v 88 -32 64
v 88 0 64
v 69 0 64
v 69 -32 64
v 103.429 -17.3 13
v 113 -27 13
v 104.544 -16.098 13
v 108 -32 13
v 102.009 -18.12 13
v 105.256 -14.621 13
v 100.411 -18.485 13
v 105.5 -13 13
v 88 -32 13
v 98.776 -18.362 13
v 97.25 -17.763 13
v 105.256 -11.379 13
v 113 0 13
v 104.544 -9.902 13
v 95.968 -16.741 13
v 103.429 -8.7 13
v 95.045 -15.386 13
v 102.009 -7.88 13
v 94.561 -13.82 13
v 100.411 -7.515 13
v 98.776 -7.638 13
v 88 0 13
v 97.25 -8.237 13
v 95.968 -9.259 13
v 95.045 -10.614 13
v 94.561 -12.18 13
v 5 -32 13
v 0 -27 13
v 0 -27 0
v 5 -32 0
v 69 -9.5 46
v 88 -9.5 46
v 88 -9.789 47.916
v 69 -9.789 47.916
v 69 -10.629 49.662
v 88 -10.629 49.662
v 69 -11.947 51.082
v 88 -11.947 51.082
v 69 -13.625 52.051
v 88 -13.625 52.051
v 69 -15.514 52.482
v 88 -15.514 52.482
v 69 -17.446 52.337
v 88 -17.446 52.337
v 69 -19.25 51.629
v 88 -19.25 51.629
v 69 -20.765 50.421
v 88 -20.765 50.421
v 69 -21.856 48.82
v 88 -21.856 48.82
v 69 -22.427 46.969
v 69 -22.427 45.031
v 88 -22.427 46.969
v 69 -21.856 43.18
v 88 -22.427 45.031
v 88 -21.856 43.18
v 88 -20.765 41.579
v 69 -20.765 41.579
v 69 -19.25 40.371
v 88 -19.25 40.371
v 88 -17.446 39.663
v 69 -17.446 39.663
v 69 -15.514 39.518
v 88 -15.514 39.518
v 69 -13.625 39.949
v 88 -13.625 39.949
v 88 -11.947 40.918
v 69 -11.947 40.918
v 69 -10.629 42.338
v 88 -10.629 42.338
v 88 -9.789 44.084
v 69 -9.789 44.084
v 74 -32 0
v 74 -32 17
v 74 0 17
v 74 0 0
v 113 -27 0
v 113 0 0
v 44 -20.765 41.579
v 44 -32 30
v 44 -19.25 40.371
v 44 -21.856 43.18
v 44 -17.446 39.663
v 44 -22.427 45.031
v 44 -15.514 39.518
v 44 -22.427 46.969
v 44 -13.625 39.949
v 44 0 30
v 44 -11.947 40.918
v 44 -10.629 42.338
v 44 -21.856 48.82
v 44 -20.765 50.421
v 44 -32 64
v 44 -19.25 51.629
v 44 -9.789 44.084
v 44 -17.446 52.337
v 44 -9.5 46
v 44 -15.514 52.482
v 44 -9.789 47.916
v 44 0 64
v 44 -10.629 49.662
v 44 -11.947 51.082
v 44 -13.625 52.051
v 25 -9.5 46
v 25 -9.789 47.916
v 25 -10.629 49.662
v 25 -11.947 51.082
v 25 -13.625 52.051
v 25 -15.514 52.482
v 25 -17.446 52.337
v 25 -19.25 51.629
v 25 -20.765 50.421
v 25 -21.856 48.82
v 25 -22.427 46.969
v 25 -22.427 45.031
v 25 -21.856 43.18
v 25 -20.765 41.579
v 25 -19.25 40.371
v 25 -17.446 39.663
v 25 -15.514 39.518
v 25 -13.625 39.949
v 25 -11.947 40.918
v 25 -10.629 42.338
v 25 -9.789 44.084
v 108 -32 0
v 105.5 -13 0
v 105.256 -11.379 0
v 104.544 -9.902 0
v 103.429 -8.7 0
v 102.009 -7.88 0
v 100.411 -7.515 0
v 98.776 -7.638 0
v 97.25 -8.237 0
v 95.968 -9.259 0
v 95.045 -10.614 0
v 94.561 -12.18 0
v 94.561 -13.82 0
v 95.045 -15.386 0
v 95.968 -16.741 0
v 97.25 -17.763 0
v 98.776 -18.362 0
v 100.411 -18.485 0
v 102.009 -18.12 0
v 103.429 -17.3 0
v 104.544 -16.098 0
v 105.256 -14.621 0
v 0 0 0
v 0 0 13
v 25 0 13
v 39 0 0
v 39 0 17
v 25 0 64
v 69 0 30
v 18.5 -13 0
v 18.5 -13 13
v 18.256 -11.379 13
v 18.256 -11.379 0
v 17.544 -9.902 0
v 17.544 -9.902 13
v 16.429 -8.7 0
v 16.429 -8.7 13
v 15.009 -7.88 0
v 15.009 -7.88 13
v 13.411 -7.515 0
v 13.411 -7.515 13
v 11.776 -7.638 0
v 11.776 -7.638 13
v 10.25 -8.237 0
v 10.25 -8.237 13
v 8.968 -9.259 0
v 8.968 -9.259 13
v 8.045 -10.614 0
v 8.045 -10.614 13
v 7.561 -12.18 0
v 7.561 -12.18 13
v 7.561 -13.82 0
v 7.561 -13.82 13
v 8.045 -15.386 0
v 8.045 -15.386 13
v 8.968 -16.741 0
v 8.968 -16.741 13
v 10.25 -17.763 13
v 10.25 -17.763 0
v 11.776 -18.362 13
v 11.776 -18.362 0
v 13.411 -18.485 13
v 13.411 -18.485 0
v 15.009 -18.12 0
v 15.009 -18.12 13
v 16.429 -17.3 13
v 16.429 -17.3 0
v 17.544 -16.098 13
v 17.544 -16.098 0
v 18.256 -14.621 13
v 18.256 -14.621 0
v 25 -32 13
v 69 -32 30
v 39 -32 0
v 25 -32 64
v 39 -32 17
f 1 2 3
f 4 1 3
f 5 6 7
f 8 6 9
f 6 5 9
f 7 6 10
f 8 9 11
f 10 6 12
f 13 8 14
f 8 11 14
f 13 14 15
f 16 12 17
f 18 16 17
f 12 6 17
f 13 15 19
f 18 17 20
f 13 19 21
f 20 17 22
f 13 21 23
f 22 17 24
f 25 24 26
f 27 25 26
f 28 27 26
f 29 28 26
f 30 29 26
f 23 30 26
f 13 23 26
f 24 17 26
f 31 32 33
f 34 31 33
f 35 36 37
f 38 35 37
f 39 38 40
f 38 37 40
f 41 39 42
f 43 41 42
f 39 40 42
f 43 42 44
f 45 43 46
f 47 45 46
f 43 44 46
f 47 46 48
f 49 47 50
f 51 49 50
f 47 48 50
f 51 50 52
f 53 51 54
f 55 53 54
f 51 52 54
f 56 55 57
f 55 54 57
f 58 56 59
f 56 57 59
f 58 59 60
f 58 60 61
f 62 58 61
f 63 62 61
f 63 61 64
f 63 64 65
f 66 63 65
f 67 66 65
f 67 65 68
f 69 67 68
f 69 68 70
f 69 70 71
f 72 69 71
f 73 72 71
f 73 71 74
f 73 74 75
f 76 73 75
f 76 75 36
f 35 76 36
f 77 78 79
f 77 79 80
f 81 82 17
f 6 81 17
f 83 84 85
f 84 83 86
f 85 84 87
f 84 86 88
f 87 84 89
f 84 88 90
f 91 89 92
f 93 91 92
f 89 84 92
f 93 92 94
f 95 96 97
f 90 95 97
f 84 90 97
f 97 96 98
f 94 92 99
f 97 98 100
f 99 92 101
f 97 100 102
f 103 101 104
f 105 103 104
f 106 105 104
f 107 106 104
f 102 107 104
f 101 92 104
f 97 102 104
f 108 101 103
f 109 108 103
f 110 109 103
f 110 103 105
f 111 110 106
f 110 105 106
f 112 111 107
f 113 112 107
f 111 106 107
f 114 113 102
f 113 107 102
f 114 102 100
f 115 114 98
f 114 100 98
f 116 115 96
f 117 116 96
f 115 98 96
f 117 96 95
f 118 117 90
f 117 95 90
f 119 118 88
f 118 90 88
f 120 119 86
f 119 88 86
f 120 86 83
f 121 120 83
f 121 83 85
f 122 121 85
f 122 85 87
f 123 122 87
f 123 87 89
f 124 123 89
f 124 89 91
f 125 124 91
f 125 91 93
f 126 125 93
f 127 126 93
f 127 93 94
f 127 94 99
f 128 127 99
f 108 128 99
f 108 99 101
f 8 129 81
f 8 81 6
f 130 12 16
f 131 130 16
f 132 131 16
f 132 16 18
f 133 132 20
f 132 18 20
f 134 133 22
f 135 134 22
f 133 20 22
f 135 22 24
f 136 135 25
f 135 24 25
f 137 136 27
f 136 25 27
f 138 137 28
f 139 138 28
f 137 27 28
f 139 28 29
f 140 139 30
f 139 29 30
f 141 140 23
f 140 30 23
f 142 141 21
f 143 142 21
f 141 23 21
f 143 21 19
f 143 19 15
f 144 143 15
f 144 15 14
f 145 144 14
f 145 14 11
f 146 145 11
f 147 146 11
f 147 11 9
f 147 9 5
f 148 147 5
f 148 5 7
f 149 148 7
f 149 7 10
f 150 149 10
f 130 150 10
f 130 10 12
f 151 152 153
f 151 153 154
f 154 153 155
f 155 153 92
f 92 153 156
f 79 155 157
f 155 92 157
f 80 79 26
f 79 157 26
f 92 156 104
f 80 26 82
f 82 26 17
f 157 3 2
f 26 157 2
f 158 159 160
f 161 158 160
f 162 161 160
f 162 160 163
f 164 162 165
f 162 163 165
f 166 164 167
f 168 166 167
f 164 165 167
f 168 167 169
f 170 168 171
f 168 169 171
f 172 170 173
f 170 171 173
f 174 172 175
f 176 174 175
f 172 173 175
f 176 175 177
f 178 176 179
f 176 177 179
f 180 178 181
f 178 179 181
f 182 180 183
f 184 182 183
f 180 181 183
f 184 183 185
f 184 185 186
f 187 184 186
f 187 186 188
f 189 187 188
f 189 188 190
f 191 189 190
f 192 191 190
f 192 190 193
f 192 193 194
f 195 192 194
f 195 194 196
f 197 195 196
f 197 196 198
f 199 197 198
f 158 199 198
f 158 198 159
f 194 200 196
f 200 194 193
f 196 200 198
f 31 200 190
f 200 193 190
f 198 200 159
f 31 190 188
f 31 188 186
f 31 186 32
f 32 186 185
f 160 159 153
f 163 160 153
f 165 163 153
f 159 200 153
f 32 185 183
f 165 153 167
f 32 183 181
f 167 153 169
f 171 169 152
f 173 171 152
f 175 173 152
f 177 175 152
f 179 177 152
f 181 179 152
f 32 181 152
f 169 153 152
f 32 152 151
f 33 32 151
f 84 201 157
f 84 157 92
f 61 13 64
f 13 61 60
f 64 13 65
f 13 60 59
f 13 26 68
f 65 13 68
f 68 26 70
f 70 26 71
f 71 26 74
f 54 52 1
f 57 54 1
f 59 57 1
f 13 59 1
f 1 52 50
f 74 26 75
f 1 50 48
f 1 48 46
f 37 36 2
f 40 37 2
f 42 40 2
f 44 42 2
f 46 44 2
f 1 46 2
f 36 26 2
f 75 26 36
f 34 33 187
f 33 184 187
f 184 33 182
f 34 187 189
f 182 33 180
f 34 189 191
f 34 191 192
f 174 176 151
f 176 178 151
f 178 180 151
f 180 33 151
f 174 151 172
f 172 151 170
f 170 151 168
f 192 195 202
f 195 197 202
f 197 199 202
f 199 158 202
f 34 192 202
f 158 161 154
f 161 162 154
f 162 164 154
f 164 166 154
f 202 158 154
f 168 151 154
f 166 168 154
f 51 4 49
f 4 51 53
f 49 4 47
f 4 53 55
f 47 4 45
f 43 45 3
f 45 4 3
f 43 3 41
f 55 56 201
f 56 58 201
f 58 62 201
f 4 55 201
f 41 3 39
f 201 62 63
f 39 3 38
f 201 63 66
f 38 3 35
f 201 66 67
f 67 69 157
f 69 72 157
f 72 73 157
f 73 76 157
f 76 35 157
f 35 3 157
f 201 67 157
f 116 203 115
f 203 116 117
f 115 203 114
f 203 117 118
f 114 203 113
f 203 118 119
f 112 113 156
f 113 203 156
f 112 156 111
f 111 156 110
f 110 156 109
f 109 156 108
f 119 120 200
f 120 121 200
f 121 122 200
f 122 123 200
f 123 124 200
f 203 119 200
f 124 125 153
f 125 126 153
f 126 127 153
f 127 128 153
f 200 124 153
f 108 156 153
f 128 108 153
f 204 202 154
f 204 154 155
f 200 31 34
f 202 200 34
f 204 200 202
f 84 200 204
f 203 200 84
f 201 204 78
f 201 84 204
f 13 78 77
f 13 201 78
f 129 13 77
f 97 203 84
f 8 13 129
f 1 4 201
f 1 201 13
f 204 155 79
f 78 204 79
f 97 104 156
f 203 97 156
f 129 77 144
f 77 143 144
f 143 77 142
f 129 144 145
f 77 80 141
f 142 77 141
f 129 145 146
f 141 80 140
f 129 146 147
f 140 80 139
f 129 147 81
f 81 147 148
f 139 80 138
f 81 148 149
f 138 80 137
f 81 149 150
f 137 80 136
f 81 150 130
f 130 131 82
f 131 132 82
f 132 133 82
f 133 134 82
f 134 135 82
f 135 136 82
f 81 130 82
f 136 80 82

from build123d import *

# Parameters (mm, degrees)
F1_DEPTH = 32
F2_SIZE  = 5
F3_SIZE  = 5
F4_R     = 6.5
F5_DEPTH = 88.001
F6_R     = 5.5
F7_DEPTH = 13.001


with BuildPart() as f1:
    # F0 (on Front) → F1 (new body)
    with BuildSketch(Plane.XZ):
        Polygon((0, 13), (0, 0), (39, 0), (39, 17), (74, 17), (74, 0), (113, 0), (113, 13), (88, 13), (88, 64), (69, 64), (69, 30), (44, 30), (44, 64), (25, 64), (25, 13), align=None)
    extrude(amount=F1_DEPTH)

    # F2
    f2_edges = [f1.edges().sort_by_distance(p)[0] for p in [
        (113, -32, 6.5),
    ]]
    chamfer(f2_edges, length=F2_SIZE)

    # F3
    f3_edges = [f1.edges().sort_by_distance(p)[0] for p in [
        (0, -32, 6.5),
    ]]
    chamfer(f3_edges, length=F3_SIZE)

    # F4 (on face) → F5 (cut, through all)
    with BuildSketch(Plane.YZ.offset(88)):
        with Locations((-16, 46)):
            Circle(F4_R)
    extrude(amount=-F5_DEPTH, mode=Mode.SUBTRACT)

    # F6 (on face) → F7 (cut, through all)
    with BuildSketch(Plane.XY.offset(13)):
        with Locations((13, -13)):
            Circle(F6_R)
        with Locations((100, -13)):
            Circle(F6_R)
    extrude(amount=-F7_DEPTH, mode=Mode.SUBTRACT)


solid = f1.part
